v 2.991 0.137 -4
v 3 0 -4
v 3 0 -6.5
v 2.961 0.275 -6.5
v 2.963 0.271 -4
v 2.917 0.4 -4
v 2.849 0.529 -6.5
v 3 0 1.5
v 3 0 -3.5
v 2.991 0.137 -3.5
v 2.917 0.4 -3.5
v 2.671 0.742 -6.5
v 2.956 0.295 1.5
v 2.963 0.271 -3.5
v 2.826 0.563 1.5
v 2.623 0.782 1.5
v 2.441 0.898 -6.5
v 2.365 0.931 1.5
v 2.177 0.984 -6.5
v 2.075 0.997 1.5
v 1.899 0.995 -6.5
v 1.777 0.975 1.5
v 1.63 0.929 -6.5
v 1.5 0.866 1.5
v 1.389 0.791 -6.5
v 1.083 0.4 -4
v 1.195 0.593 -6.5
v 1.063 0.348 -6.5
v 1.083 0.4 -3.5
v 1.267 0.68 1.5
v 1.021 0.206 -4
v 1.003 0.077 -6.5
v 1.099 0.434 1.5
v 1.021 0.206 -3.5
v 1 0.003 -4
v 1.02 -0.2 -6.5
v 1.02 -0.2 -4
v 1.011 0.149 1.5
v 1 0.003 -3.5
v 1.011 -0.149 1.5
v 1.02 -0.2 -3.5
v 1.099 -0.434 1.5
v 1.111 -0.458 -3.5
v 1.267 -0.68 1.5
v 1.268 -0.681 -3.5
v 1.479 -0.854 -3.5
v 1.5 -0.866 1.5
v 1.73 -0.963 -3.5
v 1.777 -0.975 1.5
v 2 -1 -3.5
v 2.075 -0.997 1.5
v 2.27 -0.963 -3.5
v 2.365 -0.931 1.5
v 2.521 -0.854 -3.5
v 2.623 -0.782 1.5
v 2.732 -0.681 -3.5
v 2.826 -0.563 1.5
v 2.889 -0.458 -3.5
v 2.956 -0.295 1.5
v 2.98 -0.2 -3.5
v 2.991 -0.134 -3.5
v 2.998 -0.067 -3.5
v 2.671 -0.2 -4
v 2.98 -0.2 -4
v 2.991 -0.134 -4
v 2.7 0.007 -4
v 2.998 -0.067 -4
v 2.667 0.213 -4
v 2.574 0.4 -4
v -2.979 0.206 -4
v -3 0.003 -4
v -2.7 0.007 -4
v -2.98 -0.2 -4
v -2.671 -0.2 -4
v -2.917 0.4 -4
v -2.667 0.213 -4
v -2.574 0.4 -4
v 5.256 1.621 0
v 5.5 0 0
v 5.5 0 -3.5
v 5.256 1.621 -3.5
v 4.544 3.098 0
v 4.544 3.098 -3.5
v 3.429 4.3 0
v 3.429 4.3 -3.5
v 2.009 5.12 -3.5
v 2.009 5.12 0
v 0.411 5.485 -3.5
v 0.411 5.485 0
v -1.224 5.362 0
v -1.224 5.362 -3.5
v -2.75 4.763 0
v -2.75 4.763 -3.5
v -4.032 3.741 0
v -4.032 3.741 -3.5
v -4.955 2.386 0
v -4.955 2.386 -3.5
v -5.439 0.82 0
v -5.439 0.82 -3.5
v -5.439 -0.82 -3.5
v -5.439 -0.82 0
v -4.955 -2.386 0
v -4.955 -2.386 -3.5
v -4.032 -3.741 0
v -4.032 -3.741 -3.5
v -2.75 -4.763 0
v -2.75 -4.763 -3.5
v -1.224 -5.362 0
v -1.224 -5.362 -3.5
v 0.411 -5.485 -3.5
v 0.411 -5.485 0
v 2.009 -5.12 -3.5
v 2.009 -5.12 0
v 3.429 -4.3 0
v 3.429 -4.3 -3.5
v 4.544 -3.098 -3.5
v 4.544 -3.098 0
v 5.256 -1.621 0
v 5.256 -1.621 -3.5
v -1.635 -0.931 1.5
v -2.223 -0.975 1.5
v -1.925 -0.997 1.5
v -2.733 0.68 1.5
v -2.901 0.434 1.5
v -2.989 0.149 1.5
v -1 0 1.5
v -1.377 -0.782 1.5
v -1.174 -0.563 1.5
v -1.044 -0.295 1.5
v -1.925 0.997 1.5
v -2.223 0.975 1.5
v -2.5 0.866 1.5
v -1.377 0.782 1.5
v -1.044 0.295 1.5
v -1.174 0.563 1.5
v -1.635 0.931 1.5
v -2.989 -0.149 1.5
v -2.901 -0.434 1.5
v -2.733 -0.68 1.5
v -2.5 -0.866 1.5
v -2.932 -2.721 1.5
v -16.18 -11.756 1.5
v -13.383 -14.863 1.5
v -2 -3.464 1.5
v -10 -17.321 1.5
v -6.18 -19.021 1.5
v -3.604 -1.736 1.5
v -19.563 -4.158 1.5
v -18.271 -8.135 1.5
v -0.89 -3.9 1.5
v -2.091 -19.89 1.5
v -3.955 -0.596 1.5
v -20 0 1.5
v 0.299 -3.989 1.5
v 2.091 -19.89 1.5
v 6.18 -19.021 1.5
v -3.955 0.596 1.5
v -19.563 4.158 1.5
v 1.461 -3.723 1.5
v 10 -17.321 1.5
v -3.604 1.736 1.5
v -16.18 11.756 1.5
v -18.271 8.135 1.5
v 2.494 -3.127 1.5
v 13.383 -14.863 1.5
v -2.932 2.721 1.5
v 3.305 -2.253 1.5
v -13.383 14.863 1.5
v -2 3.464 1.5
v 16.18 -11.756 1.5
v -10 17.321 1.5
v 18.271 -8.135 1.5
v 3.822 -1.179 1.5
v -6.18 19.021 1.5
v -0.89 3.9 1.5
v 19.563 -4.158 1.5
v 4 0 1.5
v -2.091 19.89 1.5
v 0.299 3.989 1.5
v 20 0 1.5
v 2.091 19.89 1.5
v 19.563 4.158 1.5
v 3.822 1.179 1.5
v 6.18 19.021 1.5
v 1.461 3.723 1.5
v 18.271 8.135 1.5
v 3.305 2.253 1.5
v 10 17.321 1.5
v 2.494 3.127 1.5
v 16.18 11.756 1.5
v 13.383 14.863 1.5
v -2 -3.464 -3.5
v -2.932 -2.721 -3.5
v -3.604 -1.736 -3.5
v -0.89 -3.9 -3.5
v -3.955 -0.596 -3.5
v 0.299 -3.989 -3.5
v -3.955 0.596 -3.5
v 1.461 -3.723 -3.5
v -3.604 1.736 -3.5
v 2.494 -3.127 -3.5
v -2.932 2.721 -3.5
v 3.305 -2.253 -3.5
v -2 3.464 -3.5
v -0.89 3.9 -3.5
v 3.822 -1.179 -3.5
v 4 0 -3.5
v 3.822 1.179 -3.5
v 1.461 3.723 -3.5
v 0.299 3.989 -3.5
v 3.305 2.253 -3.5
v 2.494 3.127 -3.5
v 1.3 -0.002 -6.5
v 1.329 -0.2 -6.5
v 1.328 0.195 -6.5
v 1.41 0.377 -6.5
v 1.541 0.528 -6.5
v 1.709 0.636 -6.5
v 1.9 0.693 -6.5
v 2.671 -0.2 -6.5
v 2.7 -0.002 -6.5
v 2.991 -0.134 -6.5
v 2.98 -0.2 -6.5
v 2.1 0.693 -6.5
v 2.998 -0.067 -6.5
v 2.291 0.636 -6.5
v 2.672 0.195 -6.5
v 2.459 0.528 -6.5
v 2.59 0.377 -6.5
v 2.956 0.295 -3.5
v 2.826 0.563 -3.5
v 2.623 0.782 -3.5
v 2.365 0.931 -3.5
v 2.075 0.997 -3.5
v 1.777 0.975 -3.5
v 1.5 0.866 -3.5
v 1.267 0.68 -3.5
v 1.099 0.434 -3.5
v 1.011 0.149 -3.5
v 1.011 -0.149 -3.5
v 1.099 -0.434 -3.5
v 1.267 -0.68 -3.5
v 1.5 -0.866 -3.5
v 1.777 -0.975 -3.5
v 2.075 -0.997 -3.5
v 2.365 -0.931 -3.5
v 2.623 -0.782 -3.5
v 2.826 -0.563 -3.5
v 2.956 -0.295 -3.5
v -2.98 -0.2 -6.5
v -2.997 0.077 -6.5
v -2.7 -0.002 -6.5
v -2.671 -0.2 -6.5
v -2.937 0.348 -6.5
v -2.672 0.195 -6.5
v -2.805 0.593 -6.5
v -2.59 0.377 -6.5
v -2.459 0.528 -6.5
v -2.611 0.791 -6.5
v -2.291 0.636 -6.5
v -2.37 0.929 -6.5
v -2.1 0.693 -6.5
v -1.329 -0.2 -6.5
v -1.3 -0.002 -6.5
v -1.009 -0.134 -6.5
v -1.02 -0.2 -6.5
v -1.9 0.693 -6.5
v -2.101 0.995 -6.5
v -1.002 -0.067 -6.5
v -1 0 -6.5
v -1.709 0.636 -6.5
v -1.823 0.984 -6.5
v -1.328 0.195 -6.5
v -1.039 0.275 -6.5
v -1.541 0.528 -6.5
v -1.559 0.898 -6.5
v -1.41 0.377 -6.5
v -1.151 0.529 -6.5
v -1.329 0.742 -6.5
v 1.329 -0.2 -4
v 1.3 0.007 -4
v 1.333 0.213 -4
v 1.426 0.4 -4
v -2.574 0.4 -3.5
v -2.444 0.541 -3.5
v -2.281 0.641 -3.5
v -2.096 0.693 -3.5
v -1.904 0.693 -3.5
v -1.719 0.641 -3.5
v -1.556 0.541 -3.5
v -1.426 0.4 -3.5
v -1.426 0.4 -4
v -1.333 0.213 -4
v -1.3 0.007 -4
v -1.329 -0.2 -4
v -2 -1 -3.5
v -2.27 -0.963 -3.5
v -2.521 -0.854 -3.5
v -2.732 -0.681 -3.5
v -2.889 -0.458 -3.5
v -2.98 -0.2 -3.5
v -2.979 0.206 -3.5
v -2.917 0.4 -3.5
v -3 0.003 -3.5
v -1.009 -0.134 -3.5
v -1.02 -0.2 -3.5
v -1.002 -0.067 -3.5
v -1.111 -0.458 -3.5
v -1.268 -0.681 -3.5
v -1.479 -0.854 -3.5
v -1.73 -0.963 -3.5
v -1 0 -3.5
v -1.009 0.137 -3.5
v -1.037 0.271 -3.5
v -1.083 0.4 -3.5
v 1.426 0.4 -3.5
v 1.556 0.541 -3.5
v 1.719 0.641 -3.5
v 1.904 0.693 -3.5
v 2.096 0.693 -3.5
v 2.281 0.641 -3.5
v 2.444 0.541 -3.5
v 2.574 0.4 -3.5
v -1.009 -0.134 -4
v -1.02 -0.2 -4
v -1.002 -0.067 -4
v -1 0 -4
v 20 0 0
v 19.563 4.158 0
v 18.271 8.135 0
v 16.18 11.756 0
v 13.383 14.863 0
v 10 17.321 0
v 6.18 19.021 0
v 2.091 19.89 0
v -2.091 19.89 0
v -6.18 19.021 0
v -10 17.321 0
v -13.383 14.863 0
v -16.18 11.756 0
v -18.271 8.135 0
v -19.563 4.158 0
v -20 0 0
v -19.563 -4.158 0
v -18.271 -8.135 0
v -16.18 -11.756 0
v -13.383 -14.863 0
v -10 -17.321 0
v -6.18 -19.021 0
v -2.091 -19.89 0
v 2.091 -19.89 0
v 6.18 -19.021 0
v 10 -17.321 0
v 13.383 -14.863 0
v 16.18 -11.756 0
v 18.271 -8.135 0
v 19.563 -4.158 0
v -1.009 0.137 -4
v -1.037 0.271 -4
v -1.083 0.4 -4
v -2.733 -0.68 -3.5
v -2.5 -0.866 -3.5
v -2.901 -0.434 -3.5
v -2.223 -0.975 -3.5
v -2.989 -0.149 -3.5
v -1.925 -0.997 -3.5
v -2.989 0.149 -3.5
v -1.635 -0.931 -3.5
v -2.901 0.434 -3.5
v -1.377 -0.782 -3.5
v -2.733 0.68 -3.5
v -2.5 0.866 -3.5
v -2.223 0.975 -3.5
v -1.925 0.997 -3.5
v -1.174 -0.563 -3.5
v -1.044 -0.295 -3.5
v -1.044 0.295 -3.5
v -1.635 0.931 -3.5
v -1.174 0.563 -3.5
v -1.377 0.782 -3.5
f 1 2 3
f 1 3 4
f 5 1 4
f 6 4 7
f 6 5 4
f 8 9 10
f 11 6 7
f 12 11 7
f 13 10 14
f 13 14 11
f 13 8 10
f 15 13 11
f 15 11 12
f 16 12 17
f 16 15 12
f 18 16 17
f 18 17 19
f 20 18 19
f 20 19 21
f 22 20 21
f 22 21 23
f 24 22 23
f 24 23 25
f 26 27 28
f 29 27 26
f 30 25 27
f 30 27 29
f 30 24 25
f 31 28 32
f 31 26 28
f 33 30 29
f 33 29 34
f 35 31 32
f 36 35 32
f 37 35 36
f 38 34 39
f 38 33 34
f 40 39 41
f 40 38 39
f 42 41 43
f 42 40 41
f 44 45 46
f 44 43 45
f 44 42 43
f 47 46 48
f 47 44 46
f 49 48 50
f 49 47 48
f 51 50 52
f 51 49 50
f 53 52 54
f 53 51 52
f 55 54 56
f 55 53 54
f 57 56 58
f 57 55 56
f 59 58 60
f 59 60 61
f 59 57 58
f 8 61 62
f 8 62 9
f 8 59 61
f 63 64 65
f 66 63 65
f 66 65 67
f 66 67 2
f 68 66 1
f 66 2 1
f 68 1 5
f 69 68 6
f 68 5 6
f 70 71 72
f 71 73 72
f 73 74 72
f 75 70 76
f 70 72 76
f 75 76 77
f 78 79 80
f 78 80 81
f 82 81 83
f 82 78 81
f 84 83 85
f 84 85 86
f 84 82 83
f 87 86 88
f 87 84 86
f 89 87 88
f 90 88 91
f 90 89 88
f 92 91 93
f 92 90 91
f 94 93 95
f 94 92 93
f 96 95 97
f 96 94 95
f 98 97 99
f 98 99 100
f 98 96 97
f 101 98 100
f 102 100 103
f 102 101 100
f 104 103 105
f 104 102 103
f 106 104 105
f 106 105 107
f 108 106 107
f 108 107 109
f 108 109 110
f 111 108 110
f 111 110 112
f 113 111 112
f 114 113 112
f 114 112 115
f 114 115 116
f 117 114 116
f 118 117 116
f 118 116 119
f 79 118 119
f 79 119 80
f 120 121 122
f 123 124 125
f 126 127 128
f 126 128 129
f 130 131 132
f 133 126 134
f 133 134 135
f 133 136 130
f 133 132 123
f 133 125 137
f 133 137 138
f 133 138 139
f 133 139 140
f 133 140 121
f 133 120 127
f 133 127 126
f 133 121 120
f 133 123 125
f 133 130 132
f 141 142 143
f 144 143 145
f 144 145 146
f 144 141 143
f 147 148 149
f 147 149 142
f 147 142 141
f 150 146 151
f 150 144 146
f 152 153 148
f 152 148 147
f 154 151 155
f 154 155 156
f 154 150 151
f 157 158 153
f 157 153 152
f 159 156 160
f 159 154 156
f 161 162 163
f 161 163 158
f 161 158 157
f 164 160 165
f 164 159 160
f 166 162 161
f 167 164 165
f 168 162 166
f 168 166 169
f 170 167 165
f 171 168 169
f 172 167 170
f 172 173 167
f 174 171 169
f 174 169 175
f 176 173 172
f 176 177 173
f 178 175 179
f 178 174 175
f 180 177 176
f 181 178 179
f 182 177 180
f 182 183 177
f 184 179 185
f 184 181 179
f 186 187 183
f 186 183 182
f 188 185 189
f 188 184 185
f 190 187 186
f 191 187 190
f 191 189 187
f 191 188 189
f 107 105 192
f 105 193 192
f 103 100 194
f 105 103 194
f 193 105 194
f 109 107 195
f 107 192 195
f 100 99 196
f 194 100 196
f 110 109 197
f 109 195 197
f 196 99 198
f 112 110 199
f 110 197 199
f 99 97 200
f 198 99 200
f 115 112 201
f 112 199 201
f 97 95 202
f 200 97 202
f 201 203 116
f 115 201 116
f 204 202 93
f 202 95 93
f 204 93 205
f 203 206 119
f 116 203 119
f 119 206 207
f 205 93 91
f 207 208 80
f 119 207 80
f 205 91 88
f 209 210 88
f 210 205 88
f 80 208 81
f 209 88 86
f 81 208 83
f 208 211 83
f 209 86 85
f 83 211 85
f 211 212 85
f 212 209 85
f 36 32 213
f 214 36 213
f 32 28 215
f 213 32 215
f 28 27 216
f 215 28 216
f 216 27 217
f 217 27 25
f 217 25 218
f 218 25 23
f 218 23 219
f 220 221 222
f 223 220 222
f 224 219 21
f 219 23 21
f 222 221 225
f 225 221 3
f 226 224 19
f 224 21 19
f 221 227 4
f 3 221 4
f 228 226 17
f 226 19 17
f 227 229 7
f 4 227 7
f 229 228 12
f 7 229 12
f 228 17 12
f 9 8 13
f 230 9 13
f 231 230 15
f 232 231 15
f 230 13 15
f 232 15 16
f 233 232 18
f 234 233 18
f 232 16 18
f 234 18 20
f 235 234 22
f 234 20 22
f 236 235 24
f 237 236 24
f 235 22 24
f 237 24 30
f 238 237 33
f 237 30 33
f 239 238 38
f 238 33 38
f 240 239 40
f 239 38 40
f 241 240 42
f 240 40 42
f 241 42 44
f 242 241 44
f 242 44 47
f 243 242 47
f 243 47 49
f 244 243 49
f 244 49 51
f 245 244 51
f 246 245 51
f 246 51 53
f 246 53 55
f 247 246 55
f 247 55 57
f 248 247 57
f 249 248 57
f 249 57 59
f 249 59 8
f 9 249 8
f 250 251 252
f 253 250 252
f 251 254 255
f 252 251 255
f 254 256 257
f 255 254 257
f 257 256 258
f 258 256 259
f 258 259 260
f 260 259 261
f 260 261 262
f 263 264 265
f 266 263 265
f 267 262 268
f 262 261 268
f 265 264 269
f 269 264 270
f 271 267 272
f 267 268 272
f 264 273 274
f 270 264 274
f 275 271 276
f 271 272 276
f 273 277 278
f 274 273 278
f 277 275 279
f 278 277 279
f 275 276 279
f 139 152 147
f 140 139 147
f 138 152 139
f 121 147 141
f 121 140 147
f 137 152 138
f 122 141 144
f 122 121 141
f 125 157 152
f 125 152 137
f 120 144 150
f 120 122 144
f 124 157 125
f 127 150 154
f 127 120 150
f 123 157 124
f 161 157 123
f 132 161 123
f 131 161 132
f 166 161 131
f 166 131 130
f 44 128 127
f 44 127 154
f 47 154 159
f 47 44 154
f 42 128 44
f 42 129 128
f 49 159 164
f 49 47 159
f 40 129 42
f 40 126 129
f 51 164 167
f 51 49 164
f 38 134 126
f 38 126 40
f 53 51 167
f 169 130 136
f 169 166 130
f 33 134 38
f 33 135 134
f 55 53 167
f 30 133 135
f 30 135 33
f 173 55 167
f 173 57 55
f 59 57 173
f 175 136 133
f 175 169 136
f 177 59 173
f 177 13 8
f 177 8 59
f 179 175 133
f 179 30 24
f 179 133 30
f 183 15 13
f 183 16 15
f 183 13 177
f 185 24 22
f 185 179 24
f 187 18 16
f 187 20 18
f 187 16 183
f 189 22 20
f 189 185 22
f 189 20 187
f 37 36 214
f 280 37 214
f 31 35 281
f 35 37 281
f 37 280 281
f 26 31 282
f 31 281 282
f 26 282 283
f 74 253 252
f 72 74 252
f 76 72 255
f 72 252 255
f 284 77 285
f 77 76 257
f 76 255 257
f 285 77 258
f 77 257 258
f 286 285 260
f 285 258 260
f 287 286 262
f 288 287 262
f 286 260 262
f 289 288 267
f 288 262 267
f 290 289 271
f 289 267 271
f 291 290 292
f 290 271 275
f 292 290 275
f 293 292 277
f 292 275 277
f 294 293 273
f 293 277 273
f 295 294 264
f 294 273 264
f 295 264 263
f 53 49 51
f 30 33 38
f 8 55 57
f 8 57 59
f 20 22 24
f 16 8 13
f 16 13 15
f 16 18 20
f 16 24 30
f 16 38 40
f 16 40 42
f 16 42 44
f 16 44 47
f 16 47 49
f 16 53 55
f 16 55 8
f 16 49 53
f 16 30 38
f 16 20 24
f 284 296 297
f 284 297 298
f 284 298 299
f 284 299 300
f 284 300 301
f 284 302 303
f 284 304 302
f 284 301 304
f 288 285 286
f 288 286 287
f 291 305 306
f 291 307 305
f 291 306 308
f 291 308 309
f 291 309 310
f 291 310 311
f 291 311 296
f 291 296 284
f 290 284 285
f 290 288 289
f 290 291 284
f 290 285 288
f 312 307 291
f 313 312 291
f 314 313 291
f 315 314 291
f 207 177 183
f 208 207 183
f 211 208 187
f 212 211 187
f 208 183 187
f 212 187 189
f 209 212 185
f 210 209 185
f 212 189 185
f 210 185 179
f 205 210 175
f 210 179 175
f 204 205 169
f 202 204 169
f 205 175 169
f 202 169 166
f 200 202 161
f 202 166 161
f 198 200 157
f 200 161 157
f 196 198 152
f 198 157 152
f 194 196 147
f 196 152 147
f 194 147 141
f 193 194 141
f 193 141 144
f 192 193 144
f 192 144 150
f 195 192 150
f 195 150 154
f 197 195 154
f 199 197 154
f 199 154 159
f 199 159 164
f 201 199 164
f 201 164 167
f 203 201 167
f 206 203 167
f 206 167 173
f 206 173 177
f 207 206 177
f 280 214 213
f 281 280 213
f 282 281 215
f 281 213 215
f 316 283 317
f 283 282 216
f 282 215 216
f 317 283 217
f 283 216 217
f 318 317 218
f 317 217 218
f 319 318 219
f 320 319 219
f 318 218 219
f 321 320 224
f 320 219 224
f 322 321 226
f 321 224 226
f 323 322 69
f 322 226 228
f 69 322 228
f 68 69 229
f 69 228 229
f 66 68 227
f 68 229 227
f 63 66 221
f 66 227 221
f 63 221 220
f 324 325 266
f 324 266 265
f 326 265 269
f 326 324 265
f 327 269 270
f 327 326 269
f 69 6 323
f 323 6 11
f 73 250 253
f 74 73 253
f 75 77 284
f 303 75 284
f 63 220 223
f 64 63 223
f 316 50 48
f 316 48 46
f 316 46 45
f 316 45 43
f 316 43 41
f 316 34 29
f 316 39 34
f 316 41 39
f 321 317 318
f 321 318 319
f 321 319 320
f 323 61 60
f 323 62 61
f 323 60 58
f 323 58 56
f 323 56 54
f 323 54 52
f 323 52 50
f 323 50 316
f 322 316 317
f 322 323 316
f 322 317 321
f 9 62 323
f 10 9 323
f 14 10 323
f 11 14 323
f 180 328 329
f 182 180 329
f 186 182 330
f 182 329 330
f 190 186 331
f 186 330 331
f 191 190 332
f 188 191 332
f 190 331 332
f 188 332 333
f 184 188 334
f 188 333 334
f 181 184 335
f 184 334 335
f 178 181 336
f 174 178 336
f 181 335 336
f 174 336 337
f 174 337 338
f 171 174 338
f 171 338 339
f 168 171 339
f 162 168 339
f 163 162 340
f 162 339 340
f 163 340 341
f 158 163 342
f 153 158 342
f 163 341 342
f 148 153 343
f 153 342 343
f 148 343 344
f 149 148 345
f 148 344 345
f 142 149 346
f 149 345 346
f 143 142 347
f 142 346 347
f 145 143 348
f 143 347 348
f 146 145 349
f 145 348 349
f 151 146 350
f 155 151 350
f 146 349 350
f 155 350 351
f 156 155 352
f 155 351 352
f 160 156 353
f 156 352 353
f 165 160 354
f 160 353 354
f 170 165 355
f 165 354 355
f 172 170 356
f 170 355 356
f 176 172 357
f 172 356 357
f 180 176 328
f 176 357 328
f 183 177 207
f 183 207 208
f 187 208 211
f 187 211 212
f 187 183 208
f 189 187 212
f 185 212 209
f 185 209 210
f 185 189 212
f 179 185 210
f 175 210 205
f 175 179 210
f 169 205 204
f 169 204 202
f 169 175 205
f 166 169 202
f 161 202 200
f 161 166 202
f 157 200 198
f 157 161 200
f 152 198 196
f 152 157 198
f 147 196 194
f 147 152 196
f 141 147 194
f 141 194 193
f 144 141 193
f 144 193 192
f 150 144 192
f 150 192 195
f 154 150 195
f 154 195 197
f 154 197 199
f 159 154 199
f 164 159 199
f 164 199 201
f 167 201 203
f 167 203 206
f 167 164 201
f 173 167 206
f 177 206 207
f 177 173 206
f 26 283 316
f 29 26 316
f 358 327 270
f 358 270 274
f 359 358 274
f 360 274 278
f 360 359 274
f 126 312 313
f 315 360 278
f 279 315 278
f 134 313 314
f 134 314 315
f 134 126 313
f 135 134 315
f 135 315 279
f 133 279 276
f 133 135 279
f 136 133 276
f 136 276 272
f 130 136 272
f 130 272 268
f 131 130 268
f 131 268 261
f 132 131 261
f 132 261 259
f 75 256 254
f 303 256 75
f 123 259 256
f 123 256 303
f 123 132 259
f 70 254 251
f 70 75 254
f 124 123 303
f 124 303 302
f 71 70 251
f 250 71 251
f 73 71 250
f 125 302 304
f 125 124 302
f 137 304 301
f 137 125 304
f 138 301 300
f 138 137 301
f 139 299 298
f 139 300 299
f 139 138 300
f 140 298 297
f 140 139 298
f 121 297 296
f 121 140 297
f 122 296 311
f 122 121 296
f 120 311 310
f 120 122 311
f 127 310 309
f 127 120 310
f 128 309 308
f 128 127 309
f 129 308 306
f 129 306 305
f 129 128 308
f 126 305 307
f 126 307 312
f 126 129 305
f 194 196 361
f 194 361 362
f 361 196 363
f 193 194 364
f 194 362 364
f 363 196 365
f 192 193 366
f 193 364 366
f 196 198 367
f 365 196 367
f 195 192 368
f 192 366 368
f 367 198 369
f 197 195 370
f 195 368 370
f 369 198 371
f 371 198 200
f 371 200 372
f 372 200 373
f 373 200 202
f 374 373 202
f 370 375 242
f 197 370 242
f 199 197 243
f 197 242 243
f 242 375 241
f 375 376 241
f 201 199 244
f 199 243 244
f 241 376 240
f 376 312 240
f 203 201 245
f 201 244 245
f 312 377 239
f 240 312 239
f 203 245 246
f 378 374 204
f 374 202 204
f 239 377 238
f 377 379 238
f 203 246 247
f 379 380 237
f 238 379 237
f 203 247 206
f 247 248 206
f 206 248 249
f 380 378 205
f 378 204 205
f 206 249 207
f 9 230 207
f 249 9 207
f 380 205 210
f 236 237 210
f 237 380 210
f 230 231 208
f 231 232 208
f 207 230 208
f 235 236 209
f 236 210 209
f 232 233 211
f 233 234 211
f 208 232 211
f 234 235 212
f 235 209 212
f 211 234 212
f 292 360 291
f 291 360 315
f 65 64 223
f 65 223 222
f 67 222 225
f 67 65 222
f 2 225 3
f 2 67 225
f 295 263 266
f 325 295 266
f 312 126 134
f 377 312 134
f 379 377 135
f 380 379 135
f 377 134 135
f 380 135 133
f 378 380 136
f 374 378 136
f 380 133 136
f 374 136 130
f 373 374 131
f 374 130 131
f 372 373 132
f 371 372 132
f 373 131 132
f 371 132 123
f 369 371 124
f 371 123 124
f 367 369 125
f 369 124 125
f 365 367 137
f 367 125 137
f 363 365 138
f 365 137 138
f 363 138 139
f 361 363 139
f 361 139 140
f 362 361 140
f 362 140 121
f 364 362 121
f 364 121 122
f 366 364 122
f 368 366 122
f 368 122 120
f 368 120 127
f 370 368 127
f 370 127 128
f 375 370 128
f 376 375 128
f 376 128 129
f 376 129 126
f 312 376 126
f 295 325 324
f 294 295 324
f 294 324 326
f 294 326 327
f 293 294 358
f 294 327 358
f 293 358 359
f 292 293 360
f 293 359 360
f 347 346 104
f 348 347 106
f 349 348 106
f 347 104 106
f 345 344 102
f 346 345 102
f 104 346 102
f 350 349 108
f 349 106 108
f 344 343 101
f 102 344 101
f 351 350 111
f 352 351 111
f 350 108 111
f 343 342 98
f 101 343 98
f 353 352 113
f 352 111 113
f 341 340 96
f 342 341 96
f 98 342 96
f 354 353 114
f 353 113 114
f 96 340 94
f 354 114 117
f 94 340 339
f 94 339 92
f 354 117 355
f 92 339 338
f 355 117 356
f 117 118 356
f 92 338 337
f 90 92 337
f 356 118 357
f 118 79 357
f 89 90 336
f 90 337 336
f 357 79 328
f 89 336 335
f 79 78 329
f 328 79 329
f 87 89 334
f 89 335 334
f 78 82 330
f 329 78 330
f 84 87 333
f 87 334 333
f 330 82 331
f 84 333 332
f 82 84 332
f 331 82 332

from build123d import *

# Parameters (mm, degrees)
F0_R      = 20
F1_DEPTH  = 1.5
F2_R      = 5.5
F3_DEPTH  = 5
F4_R      = 4
F5_DEPTH  = 25
F6_R      = 4
F7_DEPTH  = 5
F8_R      = 1
F9_DEPTH  = 8
F11_DEPTH = 3
F12_DEPTH = 25
F13_W     = 2
F13_H     = 0.5
F14_DEPTH = 12.5


with BuildPart() as f1:
    # F0 (on Top) → F1 (new body)
    with BuildSketch(Plane.XY):
        Circle(F0_R)
    extrude(amount=F1_DEPTH)

    # F2 (on face) → F3 (join)
    with BuildSketch(Plane.XY.offset(1.5)):
        Circle(F2_R)
    extrude(amount=-F3_DEPTH)

    # F4 (on face) → F5 (cut)
    with BuildSketch(Plane.XY.offset(1.5)):
        Circle(F4_R)
    extrude(amount=-F5_DEPTH, mode=Mode.SUBTRACT)


with BuildPart() as f7:
    # F6 (on face) → F7 (new body)
    with BuildSketch(Plane.XY.offset(1.5)):
        Circle(F6_R)
    extrude(amount=-F7_DEPTH)

    # F8 (on face) → F12 (cut)
    with BuildSketch(Plane.XY.offset(1.5)):
        with Locations((-2, 0)):
            Circle(F8_R)
        with Locations((2, 0)):
            Circle(F8_R)
    extrude(amount=-F12_DEPTH, mode=Mode.SUBTRACT)


with BuildPart() as f9:
    # F8 (on face) → F9 (new body)
    with BuildSketch(Plane.XY.offset(1.5)):
        with Locations((-2, 0)):
            Circle(F8_R)
    extrude(amount=-F9_DEPTH)


with BuildPart() as f9b:
    # F8 (on face) → F9, piece 2 (new body)
    with BuildSketch(Plane.XY.offset(1.5)):
        with Locations((2, 0)):
            Circle(F8_R)
    extrude(amount=-F9_DEPTH)


with BuildPart() as f11_tool:
    # F10 (on face) → F11 (new body)
    with BuildSketch(Plane(origin=(0, 0, -6.5), x_dir=(1, 0, 0), z_dir=(0, 0, -1))):
        with BuildLine():
            Line((2.6708203932, 0.2), (2.9797958971, 0.2))
            ThreePointArc((2.9797958971, 0.2), (2, 1), (1.0202041029, 0.2))
            Line((1.0202041029, 0.2), (1.3291796068, 0.2))
            ThreePointArc((1.3291796068, 0.2), (2, -0.7), (2.6708203932, 0.2))
        make_face()
        with BuildLine():
            Line((-2.9797958971, 0.2), (-2.6708203932, 0.2))
            ThreePointArc((-2.6708203932, 0.2), (-2, -0.7), (-1.3291796068, 0.2))
            Line((-1.3291796068, 0.2), (-1.0202041029, 0.2))
            ThreePointArc((-1.0202041029, 0.2), (-2, 1), (-2.9797958971, 0.2))
        make_face()
    extrude(amount=-F11_DEPTH)


with BuildPart() as f9_1:
    add(f9.part)

    # F11: cut by f11_tool
    add(f11_tool.part, mode=Mode.SUBTRACT)


with BuildPart() as f9b_1:
    add(f9b.part)

    # F11: cut by f11_tool
    add(f11_tool.part, mode=Mode.SUBTRACT)


with BuildPart() as f14_tool:
    # F13 (on Right) → F14 (new body, symmetric)
    with BuildSketch(Plane.YZ):
        with Locations((-0.6, -3.75)):
            Rectangle(F13_W, F13_H)
    extrude(amount=F14_DEPTH, both=True)


with BuildPart() as f9_2:
    add(f9_1.part)

    # F14: cut by f14_tool
    add(f14_tool.part, mode=Mode.SUBTRACT)


with BuildPart() as f9b_2:
    add(f9b_1.part)

    # F14: cut by f14_tool
    add(f14_tool.part, mode=Mode.SUBTRACT)


solid = Compound([f1.part, f7.part, f9_2.part, f9b_2.part])
